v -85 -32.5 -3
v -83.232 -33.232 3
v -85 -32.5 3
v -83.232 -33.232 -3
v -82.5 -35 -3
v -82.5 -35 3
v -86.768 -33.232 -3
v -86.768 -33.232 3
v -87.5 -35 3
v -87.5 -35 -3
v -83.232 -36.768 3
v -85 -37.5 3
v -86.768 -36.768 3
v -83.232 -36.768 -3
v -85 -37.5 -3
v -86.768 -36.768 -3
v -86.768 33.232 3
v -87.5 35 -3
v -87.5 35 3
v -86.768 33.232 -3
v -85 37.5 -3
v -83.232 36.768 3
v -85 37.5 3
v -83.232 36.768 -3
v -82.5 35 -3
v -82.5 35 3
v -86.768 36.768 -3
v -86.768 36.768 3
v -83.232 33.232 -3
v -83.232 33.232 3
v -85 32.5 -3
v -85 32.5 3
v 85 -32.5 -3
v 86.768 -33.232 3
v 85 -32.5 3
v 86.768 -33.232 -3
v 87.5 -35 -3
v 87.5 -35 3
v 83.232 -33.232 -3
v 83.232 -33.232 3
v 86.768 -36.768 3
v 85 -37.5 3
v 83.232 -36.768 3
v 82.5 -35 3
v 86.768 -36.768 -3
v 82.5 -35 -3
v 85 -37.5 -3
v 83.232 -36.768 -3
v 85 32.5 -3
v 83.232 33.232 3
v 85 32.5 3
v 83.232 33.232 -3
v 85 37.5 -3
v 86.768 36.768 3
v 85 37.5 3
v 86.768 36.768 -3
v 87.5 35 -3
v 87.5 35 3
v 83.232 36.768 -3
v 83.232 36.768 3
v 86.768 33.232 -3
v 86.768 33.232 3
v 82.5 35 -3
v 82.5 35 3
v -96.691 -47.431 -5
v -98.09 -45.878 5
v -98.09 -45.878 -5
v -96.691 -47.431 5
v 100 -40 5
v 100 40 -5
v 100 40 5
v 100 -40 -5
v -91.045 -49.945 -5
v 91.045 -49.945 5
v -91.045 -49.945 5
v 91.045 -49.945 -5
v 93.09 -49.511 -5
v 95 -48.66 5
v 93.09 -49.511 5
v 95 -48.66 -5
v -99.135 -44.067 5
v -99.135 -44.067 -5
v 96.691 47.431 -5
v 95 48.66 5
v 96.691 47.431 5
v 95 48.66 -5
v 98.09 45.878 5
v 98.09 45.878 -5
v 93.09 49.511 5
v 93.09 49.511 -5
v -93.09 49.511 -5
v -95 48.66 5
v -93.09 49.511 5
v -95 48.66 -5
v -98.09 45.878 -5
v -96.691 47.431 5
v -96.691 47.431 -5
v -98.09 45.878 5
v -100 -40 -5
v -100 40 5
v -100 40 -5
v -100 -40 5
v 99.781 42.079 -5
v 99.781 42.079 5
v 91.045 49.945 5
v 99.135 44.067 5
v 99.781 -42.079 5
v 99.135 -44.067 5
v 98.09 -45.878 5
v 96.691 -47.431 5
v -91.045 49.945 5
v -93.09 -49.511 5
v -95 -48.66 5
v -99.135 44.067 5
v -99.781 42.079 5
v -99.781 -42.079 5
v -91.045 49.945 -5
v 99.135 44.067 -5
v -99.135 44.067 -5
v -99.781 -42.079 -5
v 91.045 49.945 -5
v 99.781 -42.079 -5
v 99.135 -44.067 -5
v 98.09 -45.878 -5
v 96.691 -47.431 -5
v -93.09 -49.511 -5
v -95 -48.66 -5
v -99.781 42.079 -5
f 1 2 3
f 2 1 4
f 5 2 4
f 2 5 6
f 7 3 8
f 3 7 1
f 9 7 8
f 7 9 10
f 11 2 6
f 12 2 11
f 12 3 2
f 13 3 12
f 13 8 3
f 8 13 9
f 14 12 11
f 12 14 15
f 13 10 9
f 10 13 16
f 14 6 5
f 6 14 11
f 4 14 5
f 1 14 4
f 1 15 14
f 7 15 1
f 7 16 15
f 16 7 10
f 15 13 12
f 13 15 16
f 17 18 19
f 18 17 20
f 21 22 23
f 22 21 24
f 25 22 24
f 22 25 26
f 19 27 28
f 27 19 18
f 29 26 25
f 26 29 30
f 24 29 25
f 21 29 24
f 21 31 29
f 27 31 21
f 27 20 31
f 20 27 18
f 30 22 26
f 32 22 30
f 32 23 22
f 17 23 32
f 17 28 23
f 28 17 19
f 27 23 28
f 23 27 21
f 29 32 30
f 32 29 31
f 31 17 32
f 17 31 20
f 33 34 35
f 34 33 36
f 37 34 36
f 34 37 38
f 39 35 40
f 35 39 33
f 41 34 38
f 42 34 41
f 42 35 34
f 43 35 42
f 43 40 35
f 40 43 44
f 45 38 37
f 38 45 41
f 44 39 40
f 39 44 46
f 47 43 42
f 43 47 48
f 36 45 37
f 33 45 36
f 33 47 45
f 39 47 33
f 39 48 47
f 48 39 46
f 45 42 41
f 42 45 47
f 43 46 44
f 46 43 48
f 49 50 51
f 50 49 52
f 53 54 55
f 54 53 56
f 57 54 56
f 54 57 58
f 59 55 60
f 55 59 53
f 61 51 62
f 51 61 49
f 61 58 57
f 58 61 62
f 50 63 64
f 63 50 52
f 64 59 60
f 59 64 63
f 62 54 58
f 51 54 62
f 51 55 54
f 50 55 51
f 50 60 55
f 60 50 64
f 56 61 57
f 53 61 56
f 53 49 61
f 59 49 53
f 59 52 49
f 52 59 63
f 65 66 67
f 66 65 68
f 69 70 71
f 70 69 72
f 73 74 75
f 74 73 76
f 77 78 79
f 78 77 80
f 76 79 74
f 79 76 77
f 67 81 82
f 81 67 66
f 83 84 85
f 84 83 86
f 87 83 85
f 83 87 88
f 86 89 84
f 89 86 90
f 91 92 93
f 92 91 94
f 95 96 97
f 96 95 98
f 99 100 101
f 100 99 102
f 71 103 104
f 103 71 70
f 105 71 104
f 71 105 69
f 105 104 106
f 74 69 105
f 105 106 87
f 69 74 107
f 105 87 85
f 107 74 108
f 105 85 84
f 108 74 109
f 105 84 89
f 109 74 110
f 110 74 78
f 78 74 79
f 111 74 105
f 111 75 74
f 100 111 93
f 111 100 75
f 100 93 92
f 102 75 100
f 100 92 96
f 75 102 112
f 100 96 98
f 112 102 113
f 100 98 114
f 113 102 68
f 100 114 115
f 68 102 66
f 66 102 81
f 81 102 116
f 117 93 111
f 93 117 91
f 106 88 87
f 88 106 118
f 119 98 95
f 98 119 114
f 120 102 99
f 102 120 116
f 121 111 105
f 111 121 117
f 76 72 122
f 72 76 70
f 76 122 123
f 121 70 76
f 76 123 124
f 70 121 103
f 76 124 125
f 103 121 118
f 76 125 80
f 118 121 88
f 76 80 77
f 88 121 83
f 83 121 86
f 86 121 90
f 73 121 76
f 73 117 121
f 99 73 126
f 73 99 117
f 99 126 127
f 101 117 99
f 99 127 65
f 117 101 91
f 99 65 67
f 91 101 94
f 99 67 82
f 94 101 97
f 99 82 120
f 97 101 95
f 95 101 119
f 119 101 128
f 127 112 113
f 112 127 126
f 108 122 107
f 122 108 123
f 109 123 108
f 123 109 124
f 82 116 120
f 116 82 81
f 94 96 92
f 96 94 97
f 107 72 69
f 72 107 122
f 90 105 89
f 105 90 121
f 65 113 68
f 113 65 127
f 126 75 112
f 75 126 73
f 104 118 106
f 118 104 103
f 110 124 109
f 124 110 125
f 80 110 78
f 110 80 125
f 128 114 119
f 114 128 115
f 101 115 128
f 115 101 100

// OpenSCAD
// Parameters
sheet_length = 200; // Length of the acrylic sheet
sheet_width = 100;  // Width of the acrylic sheet
sheet_thickness = 5; // Thickness of the acrylic sheet
corner_radius = 10;  // Radius for rounded corners
hole_diameter = 5;   // Diameter of mounting holes
chamfer_size = 2;    // Size of the edge chamfer
hole_offset = 15;    // Offset from the edges for mounting holes

// Main module
module acrylic_sheet() {
    difference() {
        // Base sheet with rounded corners
        rounded_rectangle(sheet_length, sheet_width, corner_radius, sheet_thickness);
        
        // Mounting holes
        for (x = [-1, 1], y = [-1, 1]) {
            translate([x * (sheet_length / 2 - hole_offset), y * (sheet_width / 2 - hole_offset), 0])
                cylinder(h = sheet_thickness + 1, d = hole_diameter, center = true);
        }
    }
    // Edge chamfer
    chamfer_edges(sheet_length, sheet_width, sheet_thickness, chamfer_size);
}

// Function to create a rounded rectangle
module rounded_rectangle(length, width, radius, thickness) {
    minkowski() {
        cube([length - 2 * radius, width - 2 * radius, thickness], center = true);
        cylinder(r = radius, h = thickness, center = true);
    }
}

// Function to chamfer the edges
module chamfer_edges(length, width, thickness, chamfer) {
    translate([-length / 2, -width / 2, 0])
        offset(delta = -chamfer)
            offset(delta = chamfer)
                cube([length, width, thickness]);
}

// Render the acrylic sheet
acrylic_sheet();
